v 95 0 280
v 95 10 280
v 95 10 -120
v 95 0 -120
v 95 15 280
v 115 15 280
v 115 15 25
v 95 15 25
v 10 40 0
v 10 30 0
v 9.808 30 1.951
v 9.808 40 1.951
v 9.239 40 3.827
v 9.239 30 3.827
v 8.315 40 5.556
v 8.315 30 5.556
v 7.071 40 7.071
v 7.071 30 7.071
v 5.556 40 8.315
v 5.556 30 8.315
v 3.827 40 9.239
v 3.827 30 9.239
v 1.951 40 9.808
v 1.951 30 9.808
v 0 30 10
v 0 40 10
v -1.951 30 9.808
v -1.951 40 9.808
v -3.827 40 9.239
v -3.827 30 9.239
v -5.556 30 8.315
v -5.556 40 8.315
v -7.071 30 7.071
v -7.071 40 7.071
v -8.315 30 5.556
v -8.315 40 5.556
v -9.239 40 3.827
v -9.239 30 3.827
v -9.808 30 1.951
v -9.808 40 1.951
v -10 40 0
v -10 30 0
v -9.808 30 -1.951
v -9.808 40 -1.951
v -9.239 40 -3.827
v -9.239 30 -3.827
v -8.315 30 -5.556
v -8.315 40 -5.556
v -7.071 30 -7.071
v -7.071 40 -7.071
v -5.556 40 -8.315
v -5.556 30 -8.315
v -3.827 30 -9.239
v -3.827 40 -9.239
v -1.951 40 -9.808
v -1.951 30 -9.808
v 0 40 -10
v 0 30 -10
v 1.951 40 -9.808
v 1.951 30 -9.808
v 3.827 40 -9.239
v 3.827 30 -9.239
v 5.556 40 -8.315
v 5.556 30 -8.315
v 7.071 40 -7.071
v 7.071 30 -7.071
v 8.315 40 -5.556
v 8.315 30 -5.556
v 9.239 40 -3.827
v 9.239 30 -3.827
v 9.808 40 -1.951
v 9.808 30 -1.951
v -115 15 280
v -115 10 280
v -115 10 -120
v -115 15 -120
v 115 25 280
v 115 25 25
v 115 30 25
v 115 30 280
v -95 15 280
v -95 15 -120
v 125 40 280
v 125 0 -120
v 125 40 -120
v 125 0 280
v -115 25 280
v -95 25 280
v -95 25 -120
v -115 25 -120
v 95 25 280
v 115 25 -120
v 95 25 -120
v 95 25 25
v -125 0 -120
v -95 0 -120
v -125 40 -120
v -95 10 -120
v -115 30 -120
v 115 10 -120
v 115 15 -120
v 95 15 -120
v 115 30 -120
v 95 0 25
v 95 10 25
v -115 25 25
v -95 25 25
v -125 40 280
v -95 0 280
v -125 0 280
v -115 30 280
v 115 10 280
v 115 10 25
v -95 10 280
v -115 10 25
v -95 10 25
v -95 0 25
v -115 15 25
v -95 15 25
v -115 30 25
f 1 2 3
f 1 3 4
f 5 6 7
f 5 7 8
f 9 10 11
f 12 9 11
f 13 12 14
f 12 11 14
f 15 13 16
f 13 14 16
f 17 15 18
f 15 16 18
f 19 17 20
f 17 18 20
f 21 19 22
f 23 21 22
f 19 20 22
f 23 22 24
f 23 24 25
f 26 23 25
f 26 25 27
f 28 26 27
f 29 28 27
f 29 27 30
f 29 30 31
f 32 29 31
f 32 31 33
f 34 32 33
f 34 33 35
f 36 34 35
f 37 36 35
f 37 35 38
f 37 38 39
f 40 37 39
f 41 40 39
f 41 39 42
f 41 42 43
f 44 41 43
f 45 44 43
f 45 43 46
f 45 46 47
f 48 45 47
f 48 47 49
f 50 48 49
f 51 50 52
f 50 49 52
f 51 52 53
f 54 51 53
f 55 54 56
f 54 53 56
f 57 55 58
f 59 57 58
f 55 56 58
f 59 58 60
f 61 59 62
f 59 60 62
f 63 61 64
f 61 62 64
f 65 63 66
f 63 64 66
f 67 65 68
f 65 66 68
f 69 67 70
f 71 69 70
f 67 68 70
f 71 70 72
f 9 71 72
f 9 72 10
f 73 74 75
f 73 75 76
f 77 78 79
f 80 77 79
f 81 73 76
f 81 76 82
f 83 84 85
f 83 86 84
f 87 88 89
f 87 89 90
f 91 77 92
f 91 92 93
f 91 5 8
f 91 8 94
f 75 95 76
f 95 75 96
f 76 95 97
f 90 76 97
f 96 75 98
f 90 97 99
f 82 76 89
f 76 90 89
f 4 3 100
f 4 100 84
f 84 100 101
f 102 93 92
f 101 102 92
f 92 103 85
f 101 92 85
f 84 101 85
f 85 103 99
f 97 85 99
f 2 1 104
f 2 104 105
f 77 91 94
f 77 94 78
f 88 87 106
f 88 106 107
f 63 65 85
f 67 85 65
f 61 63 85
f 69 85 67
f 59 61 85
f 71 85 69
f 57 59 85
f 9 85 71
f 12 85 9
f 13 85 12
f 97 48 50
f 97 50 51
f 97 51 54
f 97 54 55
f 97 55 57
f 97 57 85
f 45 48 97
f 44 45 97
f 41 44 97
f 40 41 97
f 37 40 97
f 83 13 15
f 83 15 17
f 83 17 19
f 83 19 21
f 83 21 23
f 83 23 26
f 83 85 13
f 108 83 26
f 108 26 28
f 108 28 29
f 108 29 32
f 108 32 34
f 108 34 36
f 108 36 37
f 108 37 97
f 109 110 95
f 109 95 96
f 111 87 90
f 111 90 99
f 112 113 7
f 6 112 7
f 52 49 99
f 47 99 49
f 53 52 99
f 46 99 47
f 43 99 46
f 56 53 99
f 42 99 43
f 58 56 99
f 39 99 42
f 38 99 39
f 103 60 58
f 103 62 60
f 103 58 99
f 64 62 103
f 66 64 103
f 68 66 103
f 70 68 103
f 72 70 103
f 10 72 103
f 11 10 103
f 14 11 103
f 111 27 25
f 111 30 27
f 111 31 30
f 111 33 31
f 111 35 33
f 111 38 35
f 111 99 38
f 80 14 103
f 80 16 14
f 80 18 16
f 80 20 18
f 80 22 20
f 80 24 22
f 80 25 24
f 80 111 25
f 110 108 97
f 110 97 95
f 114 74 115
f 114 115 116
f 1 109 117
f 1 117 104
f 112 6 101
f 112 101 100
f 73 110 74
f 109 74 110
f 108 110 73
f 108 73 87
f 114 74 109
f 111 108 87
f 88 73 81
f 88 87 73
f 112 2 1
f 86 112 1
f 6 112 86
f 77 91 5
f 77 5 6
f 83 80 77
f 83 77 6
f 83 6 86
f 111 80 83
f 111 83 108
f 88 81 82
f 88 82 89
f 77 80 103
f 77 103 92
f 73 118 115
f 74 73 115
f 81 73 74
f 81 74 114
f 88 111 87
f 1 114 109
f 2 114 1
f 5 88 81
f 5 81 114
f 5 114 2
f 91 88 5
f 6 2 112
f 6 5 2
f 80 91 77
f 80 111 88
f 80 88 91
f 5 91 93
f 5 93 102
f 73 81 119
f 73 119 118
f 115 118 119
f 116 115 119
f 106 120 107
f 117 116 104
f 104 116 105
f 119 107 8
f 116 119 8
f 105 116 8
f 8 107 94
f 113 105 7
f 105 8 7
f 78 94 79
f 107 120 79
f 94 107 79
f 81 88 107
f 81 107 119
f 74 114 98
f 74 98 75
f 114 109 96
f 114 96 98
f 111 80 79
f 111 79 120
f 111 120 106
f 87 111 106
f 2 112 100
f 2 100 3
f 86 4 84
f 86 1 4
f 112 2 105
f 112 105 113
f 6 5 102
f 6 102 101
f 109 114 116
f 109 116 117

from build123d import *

# Parameters (mm, degrees)
F1_DEPTH      = 280
F1_DEPTH_BACK = 120
F2_R          = 10
F3_DEPTH      = 20
F5_DEPTH      = 255


with BuildPart() as f1:
    # F0 (on Top) → F1 (new body, two sides)
    with BuildSketch(Plane.XY) as f1_sk:
        Polygon((125, 40), (0, 40), (-125, 40), (-125, 0), (-95, 0), (-95, 10), (-115, 10), (-115, 15), (-95, 15), (-95, 25), (-115, 25), (-115, 30), (0, 30), (115, 30), (115, 25), (95, 25), (95, 15), (115, 15), (115, 10), (95, 10), (95, 0), (125, 0), align=None)
    extrude(amount=F1_DEPTH)
    extrude(f1_sk.sketch, amount=-F1_DEPTH_BACK)

    # F2 (on face) → F3 (cut)
    with BuildSketch(Plane.XZ.offset(-30)):
        Circle(F2_R)
    extrude(amount=-F3_DEPTH, mode=Mode.SUBTRACT)


with BuildPart() as f5:
    # F4 (on face) → F5 (new body)
    with BuildSketch(Plane.XY.offset(280)):
        Polygon((115, 30), (-115, 30), (-115, 25), (-95, 25), (-95, 15), (-115, 15), (-115, 10), (-95, 10), (-95, 0), (95, 0), (95, 10), (115, 10), (115, 15), (95, 15), (95, 25), (115, 25), align=None)
    extrude(amount=-F5_DEPTH)


solid = Compound([f1.part, f5.part])
